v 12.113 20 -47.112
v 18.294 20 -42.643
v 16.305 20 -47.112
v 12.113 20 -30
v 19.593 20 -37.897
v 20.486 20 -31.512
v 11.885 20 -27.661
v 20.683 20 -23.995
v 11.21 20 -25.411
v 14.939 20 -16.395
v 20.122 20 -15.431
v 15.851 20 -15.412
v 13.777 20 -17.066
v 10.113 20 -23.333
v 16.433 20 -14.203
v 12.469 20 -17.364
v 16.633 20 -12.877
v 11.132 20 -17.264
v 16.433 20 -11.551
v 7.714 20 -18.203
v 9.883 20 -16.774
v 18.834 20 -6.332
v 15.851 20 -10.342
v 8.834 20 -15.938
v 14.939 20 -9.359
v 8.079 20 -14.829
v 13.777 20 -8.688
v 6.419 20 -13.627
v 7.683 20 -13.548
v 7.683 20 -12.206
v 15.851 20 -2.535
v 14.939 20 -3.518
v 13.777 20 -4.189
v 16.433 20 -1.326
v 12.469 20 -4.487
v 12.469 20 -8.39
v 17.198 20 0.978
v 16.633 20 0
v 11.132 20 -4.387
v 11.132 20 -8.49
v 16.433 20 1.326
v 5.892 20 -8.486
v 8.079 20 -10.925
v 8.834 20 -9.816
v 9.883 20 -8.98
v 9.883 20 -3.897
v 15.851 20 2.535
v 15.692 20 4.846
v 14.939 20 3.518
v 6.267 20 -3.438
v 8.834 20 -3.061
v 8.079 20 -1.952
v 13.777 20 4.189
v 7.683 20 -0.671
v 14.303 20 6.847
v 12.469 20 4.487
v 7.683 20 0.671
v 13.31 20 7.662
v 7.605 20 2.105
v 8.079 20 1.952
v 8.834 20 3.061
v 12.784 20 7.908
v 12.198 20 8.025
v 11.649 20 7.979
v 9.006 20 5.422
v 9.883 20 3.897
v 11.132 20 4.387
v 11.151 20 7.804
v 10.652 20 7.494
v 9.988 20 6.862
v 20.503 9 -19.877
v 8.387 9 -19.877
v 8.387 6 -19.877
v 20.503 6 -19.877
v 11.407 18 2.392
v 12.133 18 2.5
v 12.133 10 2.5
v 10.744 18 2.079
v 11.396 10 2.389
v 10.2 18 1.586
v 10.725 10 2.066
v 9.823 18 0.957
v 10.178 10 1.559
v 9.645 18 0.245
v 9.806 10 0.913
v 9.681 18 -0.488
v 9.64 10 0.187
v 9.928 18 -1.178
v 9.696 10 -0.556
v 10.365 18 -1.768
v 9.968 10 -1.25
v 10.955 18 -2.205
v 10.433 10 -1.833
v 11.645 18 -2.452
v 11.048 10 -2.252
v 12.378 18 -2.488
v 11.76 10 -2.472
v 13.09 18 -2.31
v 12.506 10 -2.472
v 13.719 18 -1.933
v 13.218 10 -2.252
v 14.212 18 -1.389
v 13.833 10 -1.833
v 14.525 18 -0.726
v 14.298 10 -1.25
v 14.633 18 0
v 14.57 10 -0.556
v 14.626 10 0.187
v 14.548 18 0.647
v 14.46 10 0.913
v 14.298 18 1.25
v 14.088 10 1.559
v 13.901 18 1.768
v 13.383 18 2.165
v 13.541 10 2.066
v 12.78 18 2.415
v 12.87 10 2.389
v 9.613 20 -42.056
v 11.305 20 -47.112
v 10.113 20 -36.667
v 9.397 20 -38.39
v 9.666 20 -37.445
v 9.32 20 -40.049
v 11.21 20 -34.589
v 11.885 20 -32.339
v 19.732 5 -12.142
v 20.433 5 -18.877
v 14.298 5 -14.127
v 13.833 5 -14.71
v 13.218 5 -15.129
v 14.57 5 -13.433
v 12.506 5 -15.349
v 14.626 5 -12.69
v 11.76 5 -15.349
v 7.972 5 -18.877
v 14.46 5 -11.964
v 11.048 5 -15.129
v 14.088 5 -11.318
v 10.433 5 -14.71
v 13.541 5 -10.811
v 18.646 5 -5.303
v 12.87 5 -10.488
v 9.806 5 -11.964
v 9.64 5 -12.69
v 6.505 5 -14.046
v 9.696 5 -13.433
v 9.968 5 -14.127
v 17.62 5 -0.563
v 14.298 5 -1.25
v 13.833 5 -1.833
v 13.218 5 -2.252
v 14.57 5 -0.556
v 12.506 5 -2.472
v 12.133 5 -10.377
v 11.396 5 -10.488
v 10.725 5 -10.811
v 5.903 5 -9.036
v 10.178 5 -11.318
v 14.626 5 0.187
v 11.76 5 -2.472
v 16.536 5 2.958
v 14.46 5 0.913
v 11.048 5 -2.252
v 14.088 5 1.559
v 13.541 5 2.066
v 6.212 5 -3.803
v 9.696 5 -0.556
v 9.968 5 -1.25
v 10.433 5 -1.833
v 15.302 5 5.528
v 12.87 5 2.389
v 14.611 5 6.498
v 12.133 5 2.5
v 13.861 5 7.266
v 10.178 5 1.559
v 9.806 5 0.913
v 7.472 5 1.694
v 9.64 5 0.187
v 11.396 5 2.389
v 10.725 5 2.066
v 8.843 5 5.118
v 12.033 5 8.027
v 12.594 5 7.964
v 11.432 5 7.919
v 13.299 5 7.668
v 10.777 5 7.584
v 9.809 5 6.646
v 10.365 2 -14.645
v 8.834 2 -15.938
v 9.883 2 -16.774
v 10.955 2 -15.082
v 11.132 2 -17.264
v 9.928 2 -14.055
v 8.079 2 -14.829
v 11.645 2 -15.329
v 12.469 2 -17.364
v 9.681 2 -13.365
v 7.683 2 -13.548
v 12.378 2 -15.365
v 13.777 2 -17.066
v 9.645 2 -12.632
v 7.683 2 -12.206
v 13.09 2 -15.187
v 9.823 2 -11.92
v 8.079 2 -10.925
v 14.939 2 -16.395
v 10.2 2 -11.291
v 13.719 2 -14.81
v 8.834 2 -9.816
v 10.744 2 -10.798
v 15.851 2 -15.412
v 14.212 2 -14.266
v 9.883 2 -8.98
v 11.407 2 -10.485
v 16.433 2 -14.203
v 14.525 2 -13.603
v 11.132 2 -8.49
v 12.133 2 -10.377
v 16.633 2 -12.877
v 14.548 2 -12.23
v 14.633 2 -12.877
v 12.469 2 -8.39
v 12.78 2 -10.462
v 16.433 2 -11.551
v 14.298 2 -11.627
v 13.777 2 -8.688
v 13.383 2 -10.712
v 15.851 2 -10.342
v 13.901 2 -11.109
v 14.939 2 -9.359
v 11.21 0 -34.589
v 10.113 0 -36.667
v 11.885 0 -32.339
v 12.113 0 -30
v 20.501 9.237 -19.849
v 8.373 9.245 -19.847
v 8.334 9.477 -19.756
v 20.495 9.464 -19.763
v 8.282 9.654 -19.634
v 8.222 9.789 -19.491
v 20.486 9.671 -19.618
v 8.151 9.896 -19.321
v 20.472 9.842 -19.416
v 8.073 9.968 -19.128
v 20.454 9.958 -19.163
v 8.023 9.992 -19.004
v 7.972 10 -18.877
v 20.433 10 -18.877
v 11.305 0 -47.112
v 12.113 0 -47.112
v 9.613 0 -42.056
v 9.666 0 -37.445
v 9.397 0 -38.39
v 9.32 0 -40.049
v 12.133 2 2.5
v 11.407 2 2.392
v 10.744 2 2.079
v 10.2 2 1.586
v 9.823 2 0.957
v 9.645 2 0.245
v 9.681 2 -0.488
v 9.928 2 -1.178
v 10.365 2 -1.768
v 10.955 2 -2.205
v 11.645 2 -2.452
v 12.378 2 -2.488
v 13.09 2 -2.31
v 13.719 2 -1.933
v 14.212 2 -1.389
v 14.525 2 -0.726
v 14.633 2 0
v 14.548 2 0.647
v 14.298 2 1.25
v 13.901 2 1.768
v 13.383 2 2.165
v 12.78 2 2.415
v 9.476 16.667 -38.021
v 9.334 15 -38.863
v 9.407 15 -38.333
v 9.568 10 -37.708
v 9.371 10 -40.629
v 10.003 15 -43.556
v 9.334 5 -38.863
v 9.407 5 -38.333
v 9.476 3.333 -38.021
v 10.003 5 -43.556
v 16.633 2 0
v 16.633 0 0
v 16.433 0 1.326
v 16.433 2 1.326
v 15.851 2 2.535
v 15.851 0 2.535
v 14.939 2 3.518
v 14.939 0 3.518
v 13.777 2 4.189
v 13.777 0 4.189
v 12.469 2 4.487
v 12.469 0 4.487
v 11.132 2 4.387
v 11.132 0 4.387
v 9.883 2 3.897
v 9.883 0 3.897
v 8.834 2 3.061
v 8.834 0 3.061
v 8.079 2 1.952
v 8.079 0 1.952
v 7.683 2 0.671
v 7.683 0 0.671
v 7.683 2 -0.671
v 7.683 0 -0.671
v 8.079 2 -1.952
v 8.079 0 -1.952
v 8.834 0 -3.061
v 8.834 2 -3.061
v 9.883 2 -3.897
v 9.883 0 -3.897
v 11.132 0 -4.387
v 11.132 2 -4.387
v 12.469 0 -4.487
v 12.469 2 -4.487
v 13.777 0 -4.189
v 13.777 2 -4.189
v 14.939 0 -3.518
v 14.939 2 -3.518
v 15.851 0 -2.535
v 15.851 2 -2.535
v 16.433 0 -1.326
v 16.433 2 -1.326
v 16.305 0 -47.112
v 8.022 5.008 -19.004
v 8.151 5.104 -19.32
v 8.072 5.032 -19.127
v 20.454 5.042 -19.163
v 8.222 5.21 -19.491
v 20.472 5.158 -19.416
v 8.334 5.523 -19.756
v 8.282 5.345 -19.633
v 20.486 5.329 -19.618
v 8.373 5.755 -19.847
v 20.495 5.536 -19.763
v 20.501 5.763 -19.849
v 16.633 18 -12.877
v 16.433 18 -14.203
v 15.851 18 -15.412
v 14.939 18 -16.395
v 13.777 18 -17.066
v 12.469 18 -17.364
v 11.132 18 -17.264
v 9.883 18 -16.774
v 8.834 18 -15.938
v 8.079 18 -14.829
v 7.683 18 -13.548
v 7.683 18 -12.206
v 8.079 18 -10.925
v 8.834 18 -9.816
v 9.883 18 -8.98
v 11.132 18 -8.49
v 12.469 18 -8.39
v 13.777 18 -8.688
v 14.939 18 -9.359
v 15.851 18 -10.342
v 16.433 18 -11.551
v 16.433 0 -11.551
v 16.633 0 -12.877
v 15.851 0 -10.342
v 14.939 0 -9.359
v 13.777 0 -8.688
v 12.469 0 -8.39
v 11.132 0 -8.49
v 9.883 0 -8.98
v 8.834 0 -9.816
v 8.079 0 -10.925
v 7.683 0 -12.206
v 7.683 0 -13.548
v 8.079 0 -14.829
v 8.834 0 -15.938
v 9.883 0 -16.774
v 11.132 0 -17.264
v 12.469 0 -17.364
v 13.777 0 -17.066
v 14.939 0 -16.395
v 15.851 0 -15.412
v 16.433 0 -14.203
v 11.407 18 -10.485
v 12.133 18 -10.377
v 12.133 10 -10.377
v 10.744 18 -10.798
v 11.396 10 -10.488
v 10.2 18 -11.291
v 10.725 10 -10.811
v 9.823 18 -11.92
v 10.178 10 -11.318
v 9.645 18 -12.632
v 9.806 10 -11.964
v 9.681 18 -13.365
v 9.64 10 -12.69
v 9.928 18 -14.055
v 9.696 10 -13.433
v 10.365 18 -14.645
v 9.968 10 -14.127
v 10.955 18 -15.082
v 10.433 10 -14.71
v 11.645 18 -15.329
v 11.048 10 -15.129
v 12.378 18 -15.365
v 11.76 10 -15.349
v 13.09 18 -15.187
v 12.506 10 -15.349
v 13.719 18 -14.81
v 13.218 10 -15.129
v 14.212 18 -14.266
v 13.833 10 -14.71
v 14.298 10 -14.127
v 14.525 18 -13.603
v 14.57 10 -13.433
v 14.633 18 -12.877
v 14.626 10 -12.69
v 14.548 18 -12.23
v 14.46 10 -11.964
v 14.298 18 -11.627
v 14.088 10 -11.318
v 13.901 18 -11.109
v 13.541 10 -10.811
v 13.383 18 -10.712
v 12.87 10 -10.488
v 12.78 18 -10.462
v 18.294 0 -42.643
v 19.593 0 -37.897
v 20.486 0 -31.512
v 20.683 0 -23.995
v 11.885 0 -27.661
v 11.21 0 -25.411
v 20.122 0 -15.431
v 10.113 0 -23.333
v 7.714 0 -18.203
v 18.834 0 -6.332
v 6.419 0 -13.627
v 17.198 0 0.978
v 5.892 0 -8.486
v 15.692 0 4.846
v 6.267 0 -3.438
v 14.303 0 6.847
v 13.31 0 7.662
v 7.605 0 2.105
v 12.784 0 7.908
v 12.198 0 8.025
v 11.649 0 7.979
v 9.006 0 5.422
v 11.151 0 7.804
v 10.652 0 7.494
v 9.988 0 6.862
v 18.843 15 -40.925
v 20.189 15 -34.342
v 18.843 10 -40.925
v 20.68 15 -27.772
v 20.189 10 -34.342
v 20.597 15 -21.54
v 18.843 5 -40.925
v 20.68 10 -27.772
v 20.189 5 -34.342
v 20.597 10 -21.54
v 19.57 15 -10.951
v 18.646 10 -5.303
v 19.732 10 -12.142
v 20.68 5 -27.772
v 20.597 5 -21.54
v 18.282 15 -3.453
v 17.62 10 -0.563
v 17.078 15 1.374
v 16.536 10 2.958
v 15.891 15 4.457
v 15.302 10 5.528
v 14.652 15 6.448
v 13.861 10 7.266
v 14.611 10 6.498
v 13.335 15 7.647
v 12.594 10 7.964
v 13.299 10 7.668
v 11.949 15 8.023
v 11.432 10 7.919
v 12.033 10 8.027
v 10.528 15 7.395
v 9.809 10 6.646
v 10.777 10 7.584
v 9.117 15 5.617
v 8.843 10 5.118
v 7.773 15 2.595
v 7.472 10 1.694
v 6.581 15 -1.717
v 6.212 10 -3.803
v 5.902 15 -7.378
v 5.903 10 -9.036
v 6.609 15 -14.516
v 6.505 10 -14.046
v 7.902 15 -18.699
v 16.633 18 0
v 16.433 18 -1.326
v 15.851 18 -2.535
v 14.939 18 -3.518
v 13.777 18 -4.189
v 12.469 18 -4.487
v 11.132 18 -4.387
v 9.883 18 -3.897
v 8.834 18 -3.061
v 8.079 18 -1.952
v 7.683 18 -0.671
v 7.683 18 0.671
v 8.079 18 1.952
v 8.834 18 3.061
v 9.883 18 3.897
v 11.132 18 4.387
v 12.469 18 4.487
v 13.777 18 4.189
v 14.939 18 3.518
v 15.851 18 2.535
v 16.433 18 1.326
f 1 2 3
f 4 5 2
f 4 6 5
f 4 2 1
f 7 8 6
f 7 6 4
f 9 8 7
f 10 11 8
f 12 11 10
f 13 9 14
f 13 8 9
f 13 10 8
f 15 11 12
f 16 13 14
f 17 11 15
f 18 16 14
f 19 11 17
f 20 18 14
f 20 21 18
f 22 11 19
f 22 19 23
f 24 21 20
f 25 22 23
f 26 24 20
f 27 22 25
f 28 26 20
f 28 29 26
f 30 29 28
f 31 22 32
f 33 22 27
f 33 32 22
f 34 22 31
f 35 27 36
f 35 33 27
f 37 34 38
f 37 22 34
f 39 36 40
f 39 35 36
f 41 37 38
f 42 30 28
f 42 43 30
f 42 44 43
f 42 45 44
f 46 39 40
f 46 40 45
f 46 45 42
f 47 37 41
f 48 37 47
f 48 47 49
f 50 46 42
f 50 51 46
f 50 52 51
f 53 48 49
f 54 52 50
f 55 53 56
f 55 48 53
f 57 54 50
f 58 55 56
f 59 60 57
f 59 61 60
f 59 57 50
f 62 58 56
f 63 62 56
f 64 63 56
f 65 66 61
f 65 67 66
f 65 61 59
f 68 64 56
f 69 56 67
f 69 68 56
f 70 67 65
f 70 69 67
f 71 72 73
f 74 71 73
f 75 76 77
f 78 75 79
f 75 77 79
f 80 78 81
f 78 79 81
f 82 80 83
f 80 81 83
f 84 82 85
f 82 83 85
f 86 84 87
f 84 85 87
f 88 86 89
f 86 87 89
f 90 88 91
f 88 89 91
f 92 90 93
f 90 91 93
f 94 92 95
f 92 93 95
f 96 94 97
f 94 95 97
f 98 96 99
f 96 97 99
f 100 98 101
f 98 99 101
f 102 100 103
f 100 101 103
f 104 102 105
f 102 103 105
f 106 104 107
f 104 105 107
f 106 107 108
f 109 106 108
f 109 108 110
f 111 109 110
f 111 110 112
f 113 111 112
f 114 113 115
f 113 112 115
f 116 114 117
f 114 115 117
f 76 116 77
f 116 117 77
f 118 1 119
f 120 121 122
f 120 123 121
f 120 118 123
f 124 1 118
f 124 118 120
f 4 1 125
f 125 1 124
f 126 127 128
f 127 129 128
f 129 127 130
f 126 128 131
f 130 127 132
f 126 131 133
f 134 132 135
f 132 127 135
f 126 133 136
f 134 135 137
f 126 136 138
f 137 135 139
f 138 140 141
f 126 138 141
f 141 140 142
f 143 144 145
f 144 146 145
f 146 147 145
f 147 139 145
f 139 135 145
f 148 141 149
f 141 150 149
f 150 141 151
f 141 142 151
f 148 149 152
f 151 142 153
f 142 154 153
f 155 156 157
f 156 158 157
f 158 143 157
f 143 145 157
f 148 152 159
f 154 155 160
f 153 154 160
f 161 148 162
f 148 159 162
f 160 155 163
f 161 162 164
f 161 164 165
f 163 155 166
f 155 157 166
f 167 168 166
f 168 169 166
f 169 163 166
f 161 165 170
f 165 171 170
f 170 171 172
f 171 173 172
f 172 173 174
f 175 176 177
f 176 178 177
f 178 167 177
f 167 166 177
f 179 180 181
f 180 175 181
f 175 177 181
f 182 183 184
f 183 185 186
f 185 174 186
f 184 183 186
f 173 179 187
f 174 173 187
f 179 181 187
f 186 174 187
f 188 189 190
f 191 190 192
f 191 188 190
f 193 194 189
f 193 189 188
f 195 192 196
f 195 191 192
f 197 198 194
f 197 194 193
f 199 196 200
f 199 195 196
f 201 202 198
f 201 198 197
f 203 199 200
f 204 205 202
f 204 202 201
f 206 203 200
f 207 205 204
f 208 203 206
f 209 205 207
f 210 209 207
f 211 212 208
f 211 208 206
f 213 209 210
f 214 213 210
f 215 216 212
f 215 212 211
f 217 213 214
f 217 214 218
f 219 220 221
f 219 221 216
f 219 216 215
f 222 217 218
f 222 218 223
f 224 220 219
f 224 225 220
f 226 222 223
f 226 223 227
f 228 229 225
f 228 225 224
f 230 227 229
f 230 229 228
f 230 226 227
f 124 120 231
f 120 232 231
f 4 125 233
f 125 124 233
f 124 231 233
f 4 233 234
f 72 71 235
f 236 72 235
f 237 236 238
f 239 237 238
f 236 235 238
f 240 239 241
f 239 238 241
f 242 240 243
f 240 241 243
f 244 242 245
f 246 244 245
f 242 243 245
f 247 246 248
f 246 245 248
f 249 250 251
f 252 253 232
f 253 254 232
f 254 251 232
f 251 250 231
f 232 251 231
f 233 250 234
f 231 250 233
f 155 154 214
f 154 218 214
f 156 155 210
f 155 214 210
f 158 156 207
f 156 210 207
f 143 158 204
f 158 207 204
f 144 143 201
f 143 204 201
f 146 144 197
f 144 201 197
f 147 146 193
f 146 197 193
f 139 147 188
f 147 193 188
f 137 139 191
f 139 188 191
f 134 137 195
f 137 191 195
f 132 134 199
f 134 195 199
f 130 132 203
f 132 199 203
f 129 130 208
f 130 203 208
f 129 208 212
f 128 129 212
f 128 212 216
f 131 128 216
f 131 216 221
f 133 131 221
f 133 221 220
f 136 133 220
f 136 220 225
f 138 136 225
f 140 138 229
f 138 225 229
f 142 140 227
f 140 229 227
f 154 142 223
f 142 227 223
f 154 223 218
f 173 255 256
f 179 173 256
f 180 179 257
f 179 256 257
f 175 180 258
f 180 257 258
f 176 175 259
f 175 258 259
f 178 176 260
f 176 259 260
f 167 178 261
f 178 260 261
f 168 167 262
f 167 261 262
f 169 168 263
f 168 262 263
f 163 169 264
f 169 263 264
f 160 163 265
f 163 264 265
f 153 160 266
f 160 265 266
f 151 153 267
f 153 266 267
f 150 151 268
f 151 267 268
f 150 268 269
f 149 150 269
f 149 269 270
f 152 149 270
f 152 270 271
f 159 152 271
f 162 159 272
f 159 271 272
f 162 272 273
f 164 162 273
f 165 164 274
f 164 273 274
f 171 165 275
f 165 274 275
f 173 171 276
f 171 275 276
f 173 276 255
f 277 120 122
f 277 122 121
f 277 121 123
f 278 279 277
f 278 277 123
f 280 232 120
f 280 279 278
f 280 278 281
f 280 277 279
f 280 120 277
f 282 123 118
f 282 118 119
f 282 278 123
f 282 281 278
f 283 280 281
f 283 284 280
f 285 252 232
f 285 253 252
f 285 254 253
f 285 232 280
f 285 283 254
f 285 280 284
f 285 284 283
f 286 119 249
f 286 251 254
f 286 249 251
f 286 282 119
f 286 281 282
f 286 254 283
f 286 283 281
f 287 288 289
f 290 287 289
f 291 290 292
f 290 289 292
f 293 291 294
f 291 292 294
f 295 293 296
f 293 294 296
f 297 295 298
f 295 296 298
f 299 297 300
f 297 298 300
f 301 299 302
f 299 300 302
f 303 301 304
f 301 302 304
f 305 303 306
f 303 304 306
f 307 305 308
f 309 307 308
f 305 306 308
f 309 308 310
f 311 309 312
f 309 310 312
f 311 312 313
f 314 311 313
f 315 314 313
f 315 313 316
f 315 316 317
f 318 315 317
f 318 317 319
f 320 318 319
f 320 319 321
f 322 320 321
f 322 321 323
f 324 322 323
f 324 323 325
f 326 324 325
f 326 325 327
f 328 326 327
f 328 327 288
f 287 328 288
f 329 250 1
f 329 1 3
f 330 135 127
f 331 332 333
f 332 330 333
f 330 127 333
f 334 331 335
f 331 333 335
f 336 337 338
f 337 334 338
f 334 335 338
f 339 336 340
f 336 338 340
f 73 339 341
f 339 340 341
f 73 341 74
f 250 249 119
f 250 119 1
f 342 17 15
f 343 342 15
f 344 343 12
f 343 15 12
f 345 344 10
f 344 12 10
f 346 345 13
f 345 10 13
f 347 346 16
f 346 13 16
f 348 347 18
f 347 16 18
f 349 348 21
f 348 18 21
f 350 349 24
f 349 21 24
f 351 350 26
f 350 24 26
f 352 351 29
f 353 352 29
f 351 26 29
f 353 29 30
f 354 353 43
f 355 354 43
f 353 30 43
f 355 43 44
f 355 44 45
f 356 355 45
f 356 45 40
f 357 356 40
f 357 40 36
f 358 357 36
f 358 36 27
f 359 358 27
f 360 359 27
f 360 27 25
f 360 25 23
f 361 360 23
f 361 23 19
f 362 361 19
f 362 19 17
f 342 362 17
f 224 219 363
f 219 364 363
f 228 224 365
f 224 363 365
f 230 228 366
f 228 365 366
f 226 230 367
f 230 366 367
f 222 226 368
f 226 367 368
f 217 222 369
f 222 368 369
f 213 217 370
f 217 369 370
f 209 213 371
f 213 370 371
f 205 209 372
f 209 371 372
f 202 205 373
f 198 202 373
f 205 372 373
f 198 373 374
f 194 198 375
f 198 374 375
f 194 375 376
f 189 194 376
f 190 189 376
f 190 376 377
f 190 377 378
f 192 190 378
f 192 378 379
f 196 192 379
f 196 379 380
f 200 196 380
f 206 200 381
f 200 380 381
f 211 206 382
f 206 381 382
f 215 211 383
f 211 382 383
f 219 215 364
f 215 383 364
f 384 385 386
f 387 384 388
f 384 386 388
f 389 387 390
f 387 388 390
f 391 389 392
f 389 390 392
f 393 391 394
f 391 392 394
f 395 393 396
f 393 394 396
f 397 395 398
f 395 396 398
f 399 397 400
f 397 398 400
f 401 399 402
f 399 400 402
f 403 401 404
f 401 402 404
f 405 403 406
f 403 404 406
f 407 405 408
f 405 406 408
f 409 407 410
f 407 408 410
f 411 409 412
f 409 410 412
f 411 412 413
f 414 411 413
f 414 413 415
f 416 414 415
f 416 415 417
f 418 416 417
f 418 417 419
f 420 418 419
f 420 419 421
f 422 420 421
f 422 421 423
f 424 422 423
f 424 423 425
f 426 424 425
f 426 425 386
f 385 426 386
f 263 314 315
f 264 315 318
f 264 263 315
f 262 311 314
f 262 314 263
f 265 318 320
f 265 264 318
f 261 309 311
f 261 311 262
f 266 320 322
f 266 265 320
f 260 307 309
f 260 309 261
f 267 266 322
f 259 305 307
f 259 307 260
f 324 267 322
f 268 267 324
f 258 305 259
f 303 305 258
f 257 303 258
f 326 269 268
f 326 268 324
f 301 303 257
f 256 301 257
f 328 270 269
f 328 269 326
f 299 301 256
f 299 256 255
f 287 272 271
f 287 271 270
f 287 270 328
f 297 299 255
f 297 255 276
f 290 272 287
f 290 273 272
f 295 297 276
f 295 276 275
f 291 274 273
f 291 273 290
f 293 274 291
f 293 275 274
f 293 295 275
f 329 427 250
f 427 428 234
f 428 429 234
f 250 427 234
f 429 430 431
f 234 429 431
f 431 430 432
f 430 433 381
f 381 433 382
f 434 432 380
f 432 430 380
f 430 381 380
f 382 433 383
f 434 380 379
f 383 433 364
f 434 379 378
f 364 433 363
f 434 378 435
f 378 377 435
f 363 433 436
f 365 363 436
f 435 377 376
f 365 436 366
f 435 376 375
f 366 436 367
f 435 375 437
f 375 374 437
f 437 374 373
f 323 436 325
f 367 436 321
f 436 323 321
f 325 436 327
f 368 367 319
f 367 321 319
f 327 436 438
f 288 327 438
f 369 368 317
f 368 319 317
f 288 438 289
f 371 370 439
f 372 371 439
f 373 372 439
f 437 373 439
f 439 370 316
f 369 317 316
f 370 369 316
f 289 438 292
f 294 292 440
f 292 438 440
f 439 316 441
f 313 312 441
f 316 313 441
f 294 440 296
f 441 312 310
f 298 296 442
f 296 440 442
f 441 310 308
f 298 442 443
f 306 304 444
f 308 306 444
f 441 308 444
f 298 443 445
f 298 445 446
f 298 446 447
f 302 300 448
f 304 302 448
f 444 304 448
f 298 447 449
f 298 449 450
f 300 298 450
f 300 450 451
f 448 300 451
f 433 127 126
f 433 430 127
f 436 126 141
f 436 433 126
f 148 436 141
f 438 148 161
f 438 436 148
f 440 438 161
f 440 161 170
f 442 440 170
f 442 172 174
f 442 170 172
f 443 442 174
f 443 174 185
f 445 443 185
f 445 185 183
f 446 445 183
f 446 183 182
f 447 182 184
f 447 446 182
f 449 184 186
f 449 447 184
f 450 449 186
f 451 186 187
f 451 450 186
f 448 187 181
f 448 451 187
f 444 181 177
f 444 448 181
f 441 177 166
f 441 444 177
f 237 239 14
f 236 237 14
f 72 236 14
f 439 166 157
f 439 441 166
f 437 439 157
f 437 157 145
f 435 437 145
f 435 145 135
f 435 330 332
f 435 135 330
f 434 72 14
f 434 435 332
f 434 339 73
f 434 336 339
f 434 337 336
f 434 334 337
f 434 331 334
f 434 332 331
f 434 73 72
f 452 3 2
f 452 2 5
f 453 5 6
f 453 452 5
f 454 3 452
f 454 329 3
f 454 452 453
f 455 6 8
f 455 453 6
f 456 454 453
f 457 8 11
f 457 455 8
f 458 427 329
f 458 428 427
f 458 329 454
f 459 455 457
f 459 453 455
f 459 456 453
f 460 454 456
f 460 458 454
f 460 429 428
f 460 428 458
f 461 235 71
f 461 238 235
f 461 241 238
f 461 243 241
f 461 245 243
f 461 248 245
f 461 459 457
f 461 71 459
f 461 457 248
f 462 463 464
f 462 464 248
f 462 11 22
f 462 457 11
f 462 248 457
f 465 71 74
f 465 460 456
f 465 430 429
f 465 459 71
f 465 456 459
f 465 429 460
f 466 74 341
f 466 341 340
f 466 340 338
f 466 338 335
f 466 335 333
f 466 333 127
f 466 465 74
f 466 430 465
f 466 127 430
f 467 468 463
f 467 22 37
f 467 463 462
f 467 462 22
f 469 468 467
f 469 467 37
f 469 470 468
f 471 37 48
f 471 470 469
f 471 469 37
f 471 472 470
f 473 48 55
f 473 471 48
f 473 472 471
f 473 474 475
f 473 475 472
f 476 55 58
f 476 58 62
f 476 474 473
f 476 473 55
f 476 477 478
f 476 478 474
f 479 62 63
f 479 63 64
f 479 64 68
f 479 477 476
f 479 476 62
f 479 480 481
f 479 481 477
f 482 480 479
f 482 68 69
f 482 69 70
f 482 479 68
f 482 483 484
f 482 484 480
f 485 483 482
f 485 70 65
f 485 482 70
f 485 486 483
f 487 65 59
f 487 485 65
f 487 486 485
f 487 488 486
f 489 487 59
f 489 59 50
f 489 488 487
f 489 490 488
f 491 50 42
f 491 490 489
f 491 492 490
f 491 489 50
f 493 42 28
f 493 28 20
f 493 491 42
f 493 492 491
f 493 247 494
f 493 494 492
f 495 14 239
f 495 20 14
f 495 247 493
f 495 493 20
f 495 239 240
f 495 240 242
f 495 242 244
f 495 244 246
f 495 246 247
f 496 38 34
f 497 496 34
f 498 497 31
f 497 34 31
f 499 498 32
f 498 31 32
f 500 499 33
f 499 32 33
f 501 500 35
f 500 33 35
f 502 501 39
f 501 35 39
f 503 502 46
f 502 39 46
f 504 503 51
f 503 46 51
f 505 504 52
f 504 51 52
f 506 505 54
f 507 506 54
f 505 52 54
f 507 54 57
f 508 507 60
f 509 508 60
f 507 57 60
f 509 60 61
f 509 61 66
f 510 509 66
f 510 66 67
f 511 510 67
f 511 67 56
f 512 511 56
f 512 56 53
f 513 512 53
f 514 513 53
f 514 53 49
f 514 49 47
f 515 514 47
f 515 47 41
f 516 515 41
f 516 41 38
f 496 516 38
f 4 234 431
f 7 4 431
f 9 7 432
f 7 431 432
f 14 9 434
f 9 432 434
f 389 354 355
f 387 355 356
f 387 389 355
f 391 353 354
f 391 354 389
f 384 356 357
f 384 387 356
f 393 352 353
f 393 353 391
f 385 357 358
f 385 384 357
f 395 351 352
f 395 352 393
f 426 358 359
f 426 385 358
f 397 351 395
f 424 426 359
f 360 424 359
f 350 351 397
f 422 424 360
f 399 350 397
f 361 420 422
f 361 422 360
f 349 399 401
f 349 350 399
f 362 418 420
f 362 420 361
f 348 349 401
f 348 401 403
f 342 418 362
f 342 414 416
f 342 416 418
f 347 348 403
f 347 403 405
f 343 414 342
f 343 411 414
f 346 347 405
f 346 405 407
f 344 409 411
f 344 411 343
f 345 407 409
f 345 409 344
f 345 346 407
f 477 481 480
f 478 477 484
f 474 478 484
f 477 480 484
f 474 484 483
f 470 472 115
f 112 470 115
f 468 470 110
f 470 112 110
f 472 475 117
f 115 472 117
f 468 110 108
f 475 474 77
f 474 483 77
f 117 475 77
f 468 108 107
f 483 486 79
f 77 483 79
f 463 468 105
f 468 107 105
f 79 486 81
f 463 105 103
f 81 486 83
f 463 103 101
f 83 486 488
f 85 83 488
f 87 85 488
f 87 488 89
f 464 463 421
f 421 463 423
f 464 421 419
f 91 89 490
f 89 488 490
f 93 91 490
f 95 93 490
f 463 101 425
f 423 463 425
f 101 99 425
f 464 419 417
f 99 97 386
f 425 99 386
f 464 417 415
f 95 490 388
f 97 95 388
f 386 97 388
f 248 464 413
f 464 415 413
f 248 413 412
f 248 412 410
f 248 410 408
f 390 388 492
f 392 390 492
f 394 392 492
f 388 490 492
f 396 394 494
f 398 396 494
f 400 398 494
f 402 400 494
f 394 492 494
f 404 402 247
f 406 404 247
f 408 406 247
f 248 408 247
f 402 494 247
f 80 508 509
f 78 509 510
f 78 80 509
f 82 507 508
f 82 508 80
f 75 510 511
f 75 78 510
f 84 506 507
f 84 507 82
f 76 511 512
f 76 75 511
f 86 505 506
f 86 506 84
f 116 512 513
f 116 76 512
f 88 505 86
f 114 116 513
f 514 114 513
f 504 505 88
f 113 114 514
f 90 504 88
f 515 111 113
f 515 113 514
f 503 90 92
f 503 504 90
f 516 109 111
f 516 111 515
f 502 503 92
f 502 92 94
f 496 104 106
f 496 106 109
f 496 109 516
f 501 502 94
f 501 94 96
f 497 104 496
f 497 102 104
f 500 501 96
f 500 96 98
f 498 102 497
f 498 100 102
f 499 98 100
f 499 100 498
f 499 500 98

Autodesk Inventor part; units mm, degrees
ref_plane "XZ Plane" through (0, 0, 0) normal (0, 1, 0) x (-1, 0, 0)
ref_plane "XY Plane" through (0, 0, 0) normal (0, 0, 1) x (1, 0, 0)
sketch "Sketch1" plane through (0, 0, 0) normal (0, 1, 0) x (-1, 0, 0)
  line L0 (-12.113, 0) -> (-12.113, -47.112)
  arc A0 (-10.113, -23.3328) -> (-10.113, -36.6672) centre (0, -30) ccw
  spline S0 degree 2 poles (-10.113, -36.6672) (-8.0323, -39.3688) (-11.3054, -47.112) knots 0 0 0 1 1 1
  line L1 (-11.3054, -47.112) -> (-16.3054, -47.112)
  line L2 (-16.3054, -47.112) -> (-22.824, -35.4482) construction
  line L3 (-22.824, -35.4482) -> (-19.0316, -2.7043) construction
  line L4 (-19.0316, -2.7043) -> (-16.3054, 5.9052) construction
  line L5 (-16.3054, 5.9052) -> (-10.5542, 11.5518) construction
  line L6 (-10.5542, 11.5518) -> (-6.122, 0.697) construction
  line L7 (-6.122, 0.697) -> (-4.6066, -13.5917) construction
  line L8 (-4.6066, -13.5917) -> (-10.113, -23.3328) construction
  spline S1 degree 4 poles (-16.3054, -47.112) (-22.824, -35.4482) (-19.0316, -2.7043) (-16.3054, 5.9052) (-10.5542, 11.5518) (-6.122, 0.697) (-4.6066, -13.5917) (-10.113, -23.3328) knots 0 0 0 0 0 1 2 3 4 4 4 4 4
  point P0 (0, 0)
  point P1 (-12.113, -30)
  point P2 (-12.113, -12.887)
  point P3 (-9.3056, -39.3909)
  dimension "d0" = 47.112
  dimension "d1" = 0
  dimension "d2" = 12.113
  dimension "d3" = 30
  dimension "d4" = 12.887
  dimension "d5" = 12.113
  dimension "d6" = 2
  dimension "d7" = 2
  dimension "d8" = 5
extrude "Extrusion1" add sketch "Sketch1" along normal blind 20
sketch "Sketch2" plane through (0, 20, 0) normal (0, 1, 0) x (1, 0, 0)
  point P0 (0, 0)
  point P1 (12.133, 0)
  point P2 (12.133, 12.877)
  dimension "d11" = 12.133
  dimension "d12" = 0
  dimension "d13" = 12.877
hole "Hole1" at (12.133, 20, 0) at (12.133, 20, -12.877) direction (0, -1, 0) diameter 5 end through all
ref_plane "Work Plane1" through (5.8904, 10, -8.1838) normal (-1, 0, 0) x (0, -1, 0)
sketch "Sketch3" plane through (5.8904, 10, -8.1838) normal (-1, 0, 0) x (0, -1, 0)
  line L0 (0, -11.6932) -> (5, -11.6932)
  line L1 (5, -11.6932) -> (5, 38.3068)
  line L2 (5, 38.3068) -> (0, 38.3068)
  line L3 (0, 38.3068) -> (0, -11.6932)
  line L4 (10, 10.6838) -> (10, 5.6838) projected
  line L5 (-10, 5.6838) -> (-10, 10.6838) projected
  line L6 (10, -2.1932) -> (10, -7.1932) projected
  line L7 (-10, -7.1932) -> (-10, -2.1932) projected
  point P0 (10, 8.1838)
  dimension "d22" = 5
  dimension "d23" = 20
  dimension "d24" = 10
  dimension "d25" = 50
  dimension "d29" = 5
  dimension "d30" = 4.5
extrude "Extrusion2" cut sketch "Sketch3" against normal through all
fillet "Fillet1" radius 1 2 edges at (14.4446, 10, -19.877) (14.4446, 5, -19.877)
sketch "Sketch4" plane through (0, 20, 0) normal (0, 1, 0) x (1, 0, 0)
  circle A0 centre (12.133, 12.877) radius 2.5 projected
  circle A1 centre (12.133, 0) radius 2.5 projected
  circle A2 centre (12.133, 12.877) radius 4.5
  circle A3 centre (12.133, 0) radius 4.5
  point P0 (0, 0)
  dimension "d31" = 2
  dimension "d32" = 2
extrude "Extrusion3" cut sketch "Sketch4" against normal blind 2
sketch "Sketch5" plane through (0, 0, 0) normal (0, -1, 0) x (1, 0, 0)
  circle A0 centre (12.133, -12.877) radius 2.5 projected
  circle A1 centre (12.133, 0) radius 2.5 projected
  circle A2 centre (12.133, -12.877) radius 4.5
  circle A3 centre (12.133, 0) radius 4.5
  point P0 (0, 0)
  dimension "d35" = 2
  dimension "d36" = 2
extrude "Extrusion4" cut sketch "Sketch5" against normal blind 2
equation "\"d5\" = d2"
equation "\"d7\" = d6"
properties part number "holder3_l2" material "Steel, Galvanized"
